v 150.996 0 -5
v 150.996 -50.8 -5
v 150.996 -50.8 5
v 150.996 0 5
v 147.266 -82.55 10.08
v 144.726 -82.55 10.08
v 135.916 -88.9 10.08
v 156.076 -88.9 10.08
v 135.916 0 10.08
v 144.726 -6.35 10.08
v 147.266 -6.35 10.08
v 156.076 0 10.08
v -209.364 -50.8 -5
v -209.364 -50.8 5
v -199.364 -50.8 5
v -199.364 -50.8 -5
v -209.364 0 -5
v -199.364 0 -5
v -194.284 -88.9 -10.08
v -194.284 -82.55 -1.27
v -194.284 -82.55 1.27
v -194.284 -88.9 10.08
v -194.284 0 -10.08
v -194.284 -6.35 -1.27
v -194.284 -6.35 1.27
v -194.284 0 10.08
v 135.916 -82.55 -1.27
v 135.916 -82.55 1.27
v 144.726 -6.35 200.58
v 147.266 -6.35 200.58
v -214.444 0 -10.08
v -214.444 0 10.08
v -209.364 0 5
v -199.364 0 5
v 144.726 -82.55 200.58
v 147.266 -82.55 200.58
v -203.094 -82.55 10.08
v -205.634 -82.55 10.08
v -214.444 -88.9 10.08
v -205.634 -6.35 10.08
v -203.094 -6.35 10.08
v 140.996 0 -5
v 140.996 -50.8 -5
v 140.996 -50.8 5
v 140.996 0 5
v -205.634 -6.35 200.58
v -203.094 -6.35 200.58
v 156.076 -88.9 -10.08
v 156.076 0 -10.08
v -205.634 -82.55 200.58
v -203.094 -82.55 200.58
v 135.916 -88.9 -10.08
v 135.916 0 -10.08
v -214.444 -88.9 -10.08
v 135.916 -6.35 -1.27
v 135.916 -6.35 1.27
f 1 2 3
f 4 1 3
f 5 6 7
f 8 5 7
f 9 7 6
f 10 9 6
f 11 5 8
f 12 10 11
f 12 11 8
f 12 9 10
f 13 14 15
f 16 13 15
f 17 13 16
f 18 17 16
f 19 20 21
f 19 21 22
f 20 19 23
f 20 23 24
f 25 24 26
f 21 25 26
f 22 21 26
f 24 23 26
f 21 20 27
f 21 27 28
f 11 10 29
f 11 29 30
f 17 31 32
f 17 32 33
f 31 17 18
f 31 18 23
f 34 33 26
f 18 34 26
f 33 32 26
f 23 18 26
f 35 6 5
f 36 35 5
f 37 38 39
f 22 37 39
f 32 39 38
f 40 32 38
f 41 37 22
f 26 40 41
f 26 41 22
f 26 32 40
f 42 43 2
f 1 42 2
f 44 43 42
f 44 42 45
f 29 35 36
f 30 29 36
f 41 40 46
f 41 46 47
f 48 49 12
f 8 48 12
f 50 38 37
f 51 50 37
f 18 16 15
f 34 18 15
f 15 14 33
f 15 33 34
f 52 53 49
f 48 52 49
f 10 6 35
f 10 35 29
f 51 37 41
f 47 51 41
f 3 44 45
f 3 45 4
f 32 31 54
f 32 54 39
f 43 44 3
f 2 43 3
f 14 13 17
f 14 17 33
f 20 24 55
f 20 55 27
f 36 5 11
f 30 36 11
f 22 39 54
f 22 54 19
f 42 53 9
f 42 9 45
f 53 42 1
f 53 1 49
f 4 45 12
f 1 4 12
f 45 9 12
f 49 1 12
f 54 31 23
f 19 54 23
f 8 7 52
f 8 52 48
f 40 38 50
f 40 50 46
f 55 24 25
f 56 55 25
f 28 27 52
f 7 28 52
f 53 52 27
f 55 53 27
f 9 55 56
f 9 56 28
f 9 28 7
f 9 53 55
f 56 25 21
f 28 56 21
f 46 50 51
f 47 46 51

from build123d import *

# Parameters (mm, degrees)
F0_W     = 20.16
F0_H     = 20.16
F0_W_2   = 10
F0_H_2   = 10
F1_DEPTH = 88.9
F2_DEPTH = 50.8
F3_W     = 76.2
F3_H     = 2.54
F4_DEPTH = 330.2
F5_W     = 2.54
F5_H     = 76.2
F6_DEPTH = 190.5


with BuildPart() as f1:
    # F0 (on Front) → F1 (new body)
    with BuildSketch(Plane.XZ):
        with Locations((-204.3635635233, 0)):
            Rectangle(F0_W, F0_H)
        with Locations((-204.3635635233, 0)):
            Rectangle(F0_W_2, F0_H_2, mode=Mode.SUBTRACT)
        with Locations((-204.3635635233, 0)):
            Rectangle(F0_W_2, F0_H_2)
    extrude(amount=F1_DEPTH)


with BuildPart() as f1b:
    # F0 (on Front) → F1, piece 2 (new body)
    with BuildSketch(Plane.XZ):
        with Locations((145.9964364767, 0)):
            Rectangle(F0_W, F0_H)
        with Locations((145.9964364767, 0)):
            Rectangle(F0_W_2, F0_H_2, mode=Mode.SUBTRACT)
        with Locations((145.9964364767, 0)):
            Rectangle(F0_W_2, F0_H_2)
    extrude(amount=F1_DEPTH)


with BuildPart() as f2_tool:
    # F0 (on Front) → F2 (new body)
    with BuildSketch(Plane.XZ):
        with Locations((-204.3635635233, 0)):
            Rectangle(F0_W_2, F0_H_2)
        with Locations((145.9964364767, 0)):
            Rectangle(F0_W_2, F0_H_2)
    extrude(amount=F2_DEPTH)


with BuildPart() as f1_1:
    add(f1.part)

    # F2: cut by f2_tool
    add(f2_tool.part, mode=Mode.SUBTRACT)



with BuildPart() as f1b_1:
    add(f1b.part)

    # F2: cut by f2_tool
    add(f2_tool.part, mode=Mode.SUBTRACT)


with BuildPart() as f1_2:
    add(f1_1.part)

    add(f1b_1.part)  # F4 merges F1b
    # F3 (on face) → F4 (join, through all)
    with BuildSketch(Plane(origin=(135.9164364767, 0, 0), x_dir=(0, -1, 0), z_dir=(-1, 0, 0))):
        with Locations((44.45, 0)):
            Rectangle(F3_W, F3_H)
    extrude(amount=F4_DEPTH)

    # F5 (on face) → F6 (join)
    with BuildSketch(Plane.XY.offset(10.08)):
        with Locations((-204.3635635233, -44.45)):
            Rectangle(F5_W, F5_H)
        with Locations((145.9964364767, -44.45)):
            Rectangle(F5_W, F5_H)
    extrude(amount=F6_DEPTH)


solid = f1_2.part
